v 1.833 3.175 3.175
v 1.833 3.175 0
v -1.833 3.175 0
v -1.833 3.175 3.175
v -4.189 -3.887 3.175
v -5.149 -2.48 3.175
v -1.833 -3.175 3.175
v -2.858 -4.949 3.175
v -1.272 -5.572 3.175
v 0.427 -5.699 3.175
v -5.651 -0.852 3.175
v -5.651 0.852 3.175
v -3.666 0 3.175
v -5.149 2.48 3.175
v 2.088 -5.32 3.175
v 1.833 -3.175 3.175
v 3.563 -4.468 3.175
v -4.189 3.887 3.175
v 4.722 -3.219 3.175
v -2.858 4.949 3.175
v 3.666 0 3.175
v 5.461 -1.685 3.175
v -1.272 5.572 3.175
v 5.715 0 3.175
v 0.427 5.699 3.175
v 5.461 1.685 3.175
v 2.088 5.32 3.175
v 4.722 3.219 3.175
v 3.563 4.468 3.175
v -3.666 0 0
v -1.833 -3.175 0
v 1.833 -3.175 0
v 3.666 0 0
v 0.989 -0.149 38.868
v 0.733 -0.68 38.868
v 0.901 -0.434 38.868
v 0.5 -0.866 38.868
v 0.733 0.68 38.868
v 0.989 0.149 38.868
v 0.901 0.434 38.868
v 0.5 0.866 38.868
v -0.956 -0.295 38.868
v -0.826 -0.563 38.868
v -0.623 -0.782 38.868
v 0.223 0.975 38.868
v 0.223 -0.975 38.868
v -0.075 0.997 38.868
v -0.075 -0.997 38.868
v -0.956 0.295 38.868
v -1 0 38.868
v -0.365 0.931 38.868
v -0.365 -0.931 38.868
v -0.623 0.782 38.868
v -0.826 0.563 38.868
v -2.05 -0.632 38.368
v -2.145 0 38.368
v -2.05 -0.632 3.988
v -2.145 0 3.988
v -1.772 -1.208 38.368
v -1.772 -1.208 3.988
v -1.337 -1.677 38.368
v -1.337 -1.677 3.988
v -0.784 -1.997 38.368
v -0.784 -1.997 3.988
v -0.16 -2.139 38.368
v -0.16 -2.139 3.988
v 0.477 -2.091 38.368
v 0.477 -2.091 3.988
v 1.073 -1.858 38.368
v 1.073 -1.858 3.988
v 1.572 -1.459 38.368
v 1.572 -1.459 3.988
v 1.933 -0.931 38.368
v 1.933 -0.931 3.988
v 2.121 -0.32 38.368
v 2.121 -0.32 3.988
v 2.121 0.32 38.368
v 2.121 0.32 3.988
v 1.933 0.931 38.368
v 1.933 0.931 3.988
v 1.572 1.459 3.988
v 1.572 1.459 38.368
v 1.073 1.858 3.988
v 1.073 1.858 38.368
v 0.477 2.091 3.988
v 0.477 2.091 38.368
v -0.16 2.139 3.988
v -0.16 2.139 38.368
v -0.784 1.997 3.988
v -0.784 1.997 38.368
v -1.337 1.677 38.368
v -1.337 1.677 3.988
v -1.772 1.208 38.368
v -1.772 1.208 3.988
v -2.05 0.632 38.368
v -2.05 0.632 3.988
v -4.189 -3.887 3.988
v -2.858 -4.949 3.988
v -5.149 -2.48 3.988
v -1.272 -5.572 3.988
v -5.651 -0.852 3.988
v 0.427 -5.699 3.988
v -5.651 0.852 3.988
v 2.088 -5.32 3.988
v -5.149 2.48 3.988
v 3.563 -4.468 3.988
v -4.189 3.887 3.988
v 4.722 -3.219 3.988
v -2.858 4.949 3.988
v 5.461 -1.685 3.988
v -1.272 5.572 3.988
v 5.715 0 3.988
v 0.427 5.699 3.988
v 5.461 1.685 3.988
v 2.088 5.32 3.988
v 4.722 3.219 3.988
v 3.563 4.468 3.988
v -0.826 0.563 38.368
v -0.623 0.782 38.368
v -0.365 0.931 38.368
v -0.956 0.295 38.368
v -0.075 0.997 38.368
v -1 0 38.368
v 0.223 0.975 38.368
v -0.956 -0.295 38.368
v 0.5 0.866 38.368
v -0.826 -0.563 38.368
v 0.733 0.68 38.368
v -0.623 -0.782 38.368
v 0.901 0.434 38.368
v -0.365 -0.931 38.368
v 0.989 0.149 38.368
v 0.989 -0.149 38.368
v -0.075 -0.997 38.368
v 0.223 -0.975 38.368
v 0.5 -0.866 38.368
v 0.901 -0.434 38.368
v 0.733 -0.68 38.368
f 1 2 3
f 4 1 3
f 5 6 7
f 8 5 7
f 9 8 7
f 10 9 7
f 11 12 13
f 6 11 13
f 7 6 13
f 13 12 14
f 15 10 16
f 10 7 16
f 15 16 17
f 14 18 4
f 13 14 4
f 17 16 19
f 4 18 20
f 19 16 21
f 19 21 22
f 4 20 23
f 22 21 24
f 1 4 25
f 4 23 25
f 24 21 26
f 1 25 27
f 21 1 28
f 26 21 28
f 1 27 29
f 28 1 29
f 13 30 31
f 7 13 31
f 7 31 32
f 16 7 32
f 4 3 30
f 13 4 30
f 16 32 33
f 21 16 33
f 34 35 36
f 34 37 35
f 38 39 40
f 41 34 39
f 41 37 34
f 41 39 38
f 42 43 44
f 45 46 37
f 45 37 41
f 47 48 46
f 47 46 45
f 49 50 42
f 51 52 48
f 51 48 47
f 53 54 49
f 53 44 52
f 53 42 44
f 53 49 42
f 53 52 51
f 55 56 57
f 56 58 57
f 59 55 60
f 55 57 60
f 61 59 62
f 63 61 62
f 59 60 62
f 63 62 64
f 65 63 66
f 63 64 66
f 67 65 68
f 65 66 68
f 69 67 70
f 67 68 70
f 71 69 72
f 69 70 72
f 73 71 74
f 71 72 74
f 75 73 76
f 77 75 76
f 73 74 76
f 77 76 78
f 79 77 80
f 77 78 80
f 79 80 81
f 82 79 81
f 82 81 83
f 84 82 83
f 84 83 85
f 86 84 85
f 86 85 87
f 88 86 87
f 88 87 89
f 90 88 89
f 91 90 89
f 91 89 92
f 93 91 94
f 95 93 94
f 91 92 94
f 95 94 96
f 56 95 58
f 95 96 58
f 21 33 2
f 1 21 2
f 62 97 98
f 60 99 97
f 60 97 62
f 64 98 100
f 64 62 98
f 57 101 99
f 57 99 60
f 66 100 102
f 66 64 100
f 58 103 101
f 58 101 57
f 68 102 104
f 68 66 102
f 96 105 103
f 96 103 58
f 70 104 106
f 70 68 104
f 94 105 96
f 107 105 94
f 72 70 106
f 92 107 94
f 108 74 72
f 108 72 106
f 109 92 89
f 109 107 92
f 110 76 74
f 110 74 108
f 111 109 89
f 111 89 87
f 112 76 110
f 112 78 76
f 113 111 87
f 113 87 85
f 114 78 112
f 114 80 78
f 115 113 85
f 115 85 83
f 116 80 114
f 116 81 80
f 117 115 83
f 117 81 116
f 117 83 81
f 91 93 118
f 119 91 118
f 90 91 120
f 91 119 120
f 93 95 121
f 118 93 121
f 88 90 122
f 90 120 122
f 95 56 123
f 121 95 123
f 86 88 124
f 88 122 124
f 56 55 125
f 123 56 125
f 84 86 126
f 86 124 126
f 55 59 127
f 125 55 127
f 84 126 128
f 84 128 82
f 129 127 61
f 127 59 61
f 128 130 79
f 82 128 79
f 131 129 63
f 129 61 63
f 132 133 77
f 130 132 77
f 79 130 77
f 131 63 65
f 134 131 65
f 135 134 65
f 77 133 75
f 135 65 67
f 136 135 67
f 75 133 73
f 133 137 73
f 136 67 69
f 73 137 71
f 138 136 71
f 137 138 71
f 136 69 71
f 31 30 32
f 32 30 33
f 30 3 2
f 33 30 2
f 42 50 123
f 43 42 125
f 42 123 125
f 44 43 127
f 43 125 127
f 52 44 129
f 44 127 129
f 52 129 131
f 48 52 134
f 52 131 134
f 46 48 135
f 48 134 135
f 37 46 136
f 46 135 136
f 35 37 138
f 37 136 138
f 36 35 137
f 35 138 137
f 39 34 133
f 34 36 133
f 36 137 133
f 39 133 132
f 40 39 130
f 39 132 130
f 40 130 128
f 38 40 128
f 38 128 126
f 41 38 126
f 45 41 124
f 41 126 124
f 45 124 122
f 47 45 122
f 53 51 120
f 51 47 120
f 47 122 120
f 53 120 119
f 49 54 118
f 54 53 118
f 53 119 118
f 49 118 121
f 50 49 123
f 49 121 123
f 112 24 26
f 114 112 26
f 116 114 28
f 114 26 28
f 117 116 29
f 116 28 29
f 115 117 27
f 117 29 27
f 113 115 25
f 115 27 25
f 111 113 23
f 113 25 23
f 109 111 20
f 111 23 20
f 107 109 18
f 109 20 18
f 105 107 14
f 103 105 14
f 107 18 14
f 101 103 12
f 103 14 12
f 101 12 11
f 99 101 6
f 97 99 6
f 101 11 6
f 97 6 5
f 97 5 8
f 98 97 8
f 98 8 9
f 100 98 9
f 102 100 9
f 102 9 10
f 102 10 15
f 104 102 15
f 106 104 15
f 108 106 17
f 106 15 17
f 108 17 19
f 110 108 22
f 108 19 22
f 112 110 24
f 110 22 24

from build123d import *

# Parameters (mm, degrees)
BOSS_EXTRUDE1_DEPTH     = 3.175
SKETCH2_R               = 5.715
BOSS_EXTRUDE2_DEPTH     = 0.8128
CUT_EXTRUDE1_DEPTH      = 51.094096647
CUT_EXTRUDE1_DEPTH_BACK = 51.094096647
SKETCH4_W               = 11.07
SKETCH4_H               = 6


with BuildPart() as part:
    # Sketch1 → Boss-Extrude1 (new body)
    with BuildSketch(Plane.XY):
        Polygon((3.666174209, 0), (1.833087105, 3.175), (-1.833087105, 3.175), (-3.666174209, 0), (-1.833087105, -3.175), (1.833087105, -3.175), align=None)
    extrude(amount=BOSS_EXTRUDE1_DEPTH)

    # Sketch2 → Boss-Extrude2 (add)
    with BuildSketch(Plane.XY.offset(3.175)):
        Circle(SKETCH2_R)
    extrude(amount=BOSS_EXTRUDE2_DEPTH)

    # Sketch3 → Revolve1 (revolve)
    with BuildSketch(Plane(origin=(0, 0, 0), x_dir=(0, 0, -1), z_dir=(1, 0, 0)), mode=Mode.PRIVATE) as revolve1_sk:
        Polygon((-3.9878, 0), (-49.4378, 0), (-49.4378, 2.145), (-39.3678, 2.145), (-39.3678, 1), (-38.3678, 1), (-38.3678, 2.145), (-3.9878, 2.145), align=None)
    revolve(revolve1_sk.sketch.rotate(Axis((0, 0, 3.9878), (0, 0, 1)), 90), axis=Axis((0, 0, 3.9878), (0, 0, 1)))

    # Sketch4 → Cut-Extrude1 (cut, two sides: drawn at the far end of the back side and taken through both)
    with BuildSketch(Plane(origin=(0, 0, 0), x_dir=(0, 0, -1), z_dir=(1, 0, 0)).offset(-CUT_EXTRUDE1_DEPTH_BACK)):
        with Locations((-44.4028, 0)):
            Rectangle(SKETCH4_W, SKETCH4_H)
    extrude(amount=CUT_EXTRUDE1_DEPTH + CUT_EXTRUDE1_DEPTH_BACK, mode=Mode.SUBTRACT)


solid = part.part
